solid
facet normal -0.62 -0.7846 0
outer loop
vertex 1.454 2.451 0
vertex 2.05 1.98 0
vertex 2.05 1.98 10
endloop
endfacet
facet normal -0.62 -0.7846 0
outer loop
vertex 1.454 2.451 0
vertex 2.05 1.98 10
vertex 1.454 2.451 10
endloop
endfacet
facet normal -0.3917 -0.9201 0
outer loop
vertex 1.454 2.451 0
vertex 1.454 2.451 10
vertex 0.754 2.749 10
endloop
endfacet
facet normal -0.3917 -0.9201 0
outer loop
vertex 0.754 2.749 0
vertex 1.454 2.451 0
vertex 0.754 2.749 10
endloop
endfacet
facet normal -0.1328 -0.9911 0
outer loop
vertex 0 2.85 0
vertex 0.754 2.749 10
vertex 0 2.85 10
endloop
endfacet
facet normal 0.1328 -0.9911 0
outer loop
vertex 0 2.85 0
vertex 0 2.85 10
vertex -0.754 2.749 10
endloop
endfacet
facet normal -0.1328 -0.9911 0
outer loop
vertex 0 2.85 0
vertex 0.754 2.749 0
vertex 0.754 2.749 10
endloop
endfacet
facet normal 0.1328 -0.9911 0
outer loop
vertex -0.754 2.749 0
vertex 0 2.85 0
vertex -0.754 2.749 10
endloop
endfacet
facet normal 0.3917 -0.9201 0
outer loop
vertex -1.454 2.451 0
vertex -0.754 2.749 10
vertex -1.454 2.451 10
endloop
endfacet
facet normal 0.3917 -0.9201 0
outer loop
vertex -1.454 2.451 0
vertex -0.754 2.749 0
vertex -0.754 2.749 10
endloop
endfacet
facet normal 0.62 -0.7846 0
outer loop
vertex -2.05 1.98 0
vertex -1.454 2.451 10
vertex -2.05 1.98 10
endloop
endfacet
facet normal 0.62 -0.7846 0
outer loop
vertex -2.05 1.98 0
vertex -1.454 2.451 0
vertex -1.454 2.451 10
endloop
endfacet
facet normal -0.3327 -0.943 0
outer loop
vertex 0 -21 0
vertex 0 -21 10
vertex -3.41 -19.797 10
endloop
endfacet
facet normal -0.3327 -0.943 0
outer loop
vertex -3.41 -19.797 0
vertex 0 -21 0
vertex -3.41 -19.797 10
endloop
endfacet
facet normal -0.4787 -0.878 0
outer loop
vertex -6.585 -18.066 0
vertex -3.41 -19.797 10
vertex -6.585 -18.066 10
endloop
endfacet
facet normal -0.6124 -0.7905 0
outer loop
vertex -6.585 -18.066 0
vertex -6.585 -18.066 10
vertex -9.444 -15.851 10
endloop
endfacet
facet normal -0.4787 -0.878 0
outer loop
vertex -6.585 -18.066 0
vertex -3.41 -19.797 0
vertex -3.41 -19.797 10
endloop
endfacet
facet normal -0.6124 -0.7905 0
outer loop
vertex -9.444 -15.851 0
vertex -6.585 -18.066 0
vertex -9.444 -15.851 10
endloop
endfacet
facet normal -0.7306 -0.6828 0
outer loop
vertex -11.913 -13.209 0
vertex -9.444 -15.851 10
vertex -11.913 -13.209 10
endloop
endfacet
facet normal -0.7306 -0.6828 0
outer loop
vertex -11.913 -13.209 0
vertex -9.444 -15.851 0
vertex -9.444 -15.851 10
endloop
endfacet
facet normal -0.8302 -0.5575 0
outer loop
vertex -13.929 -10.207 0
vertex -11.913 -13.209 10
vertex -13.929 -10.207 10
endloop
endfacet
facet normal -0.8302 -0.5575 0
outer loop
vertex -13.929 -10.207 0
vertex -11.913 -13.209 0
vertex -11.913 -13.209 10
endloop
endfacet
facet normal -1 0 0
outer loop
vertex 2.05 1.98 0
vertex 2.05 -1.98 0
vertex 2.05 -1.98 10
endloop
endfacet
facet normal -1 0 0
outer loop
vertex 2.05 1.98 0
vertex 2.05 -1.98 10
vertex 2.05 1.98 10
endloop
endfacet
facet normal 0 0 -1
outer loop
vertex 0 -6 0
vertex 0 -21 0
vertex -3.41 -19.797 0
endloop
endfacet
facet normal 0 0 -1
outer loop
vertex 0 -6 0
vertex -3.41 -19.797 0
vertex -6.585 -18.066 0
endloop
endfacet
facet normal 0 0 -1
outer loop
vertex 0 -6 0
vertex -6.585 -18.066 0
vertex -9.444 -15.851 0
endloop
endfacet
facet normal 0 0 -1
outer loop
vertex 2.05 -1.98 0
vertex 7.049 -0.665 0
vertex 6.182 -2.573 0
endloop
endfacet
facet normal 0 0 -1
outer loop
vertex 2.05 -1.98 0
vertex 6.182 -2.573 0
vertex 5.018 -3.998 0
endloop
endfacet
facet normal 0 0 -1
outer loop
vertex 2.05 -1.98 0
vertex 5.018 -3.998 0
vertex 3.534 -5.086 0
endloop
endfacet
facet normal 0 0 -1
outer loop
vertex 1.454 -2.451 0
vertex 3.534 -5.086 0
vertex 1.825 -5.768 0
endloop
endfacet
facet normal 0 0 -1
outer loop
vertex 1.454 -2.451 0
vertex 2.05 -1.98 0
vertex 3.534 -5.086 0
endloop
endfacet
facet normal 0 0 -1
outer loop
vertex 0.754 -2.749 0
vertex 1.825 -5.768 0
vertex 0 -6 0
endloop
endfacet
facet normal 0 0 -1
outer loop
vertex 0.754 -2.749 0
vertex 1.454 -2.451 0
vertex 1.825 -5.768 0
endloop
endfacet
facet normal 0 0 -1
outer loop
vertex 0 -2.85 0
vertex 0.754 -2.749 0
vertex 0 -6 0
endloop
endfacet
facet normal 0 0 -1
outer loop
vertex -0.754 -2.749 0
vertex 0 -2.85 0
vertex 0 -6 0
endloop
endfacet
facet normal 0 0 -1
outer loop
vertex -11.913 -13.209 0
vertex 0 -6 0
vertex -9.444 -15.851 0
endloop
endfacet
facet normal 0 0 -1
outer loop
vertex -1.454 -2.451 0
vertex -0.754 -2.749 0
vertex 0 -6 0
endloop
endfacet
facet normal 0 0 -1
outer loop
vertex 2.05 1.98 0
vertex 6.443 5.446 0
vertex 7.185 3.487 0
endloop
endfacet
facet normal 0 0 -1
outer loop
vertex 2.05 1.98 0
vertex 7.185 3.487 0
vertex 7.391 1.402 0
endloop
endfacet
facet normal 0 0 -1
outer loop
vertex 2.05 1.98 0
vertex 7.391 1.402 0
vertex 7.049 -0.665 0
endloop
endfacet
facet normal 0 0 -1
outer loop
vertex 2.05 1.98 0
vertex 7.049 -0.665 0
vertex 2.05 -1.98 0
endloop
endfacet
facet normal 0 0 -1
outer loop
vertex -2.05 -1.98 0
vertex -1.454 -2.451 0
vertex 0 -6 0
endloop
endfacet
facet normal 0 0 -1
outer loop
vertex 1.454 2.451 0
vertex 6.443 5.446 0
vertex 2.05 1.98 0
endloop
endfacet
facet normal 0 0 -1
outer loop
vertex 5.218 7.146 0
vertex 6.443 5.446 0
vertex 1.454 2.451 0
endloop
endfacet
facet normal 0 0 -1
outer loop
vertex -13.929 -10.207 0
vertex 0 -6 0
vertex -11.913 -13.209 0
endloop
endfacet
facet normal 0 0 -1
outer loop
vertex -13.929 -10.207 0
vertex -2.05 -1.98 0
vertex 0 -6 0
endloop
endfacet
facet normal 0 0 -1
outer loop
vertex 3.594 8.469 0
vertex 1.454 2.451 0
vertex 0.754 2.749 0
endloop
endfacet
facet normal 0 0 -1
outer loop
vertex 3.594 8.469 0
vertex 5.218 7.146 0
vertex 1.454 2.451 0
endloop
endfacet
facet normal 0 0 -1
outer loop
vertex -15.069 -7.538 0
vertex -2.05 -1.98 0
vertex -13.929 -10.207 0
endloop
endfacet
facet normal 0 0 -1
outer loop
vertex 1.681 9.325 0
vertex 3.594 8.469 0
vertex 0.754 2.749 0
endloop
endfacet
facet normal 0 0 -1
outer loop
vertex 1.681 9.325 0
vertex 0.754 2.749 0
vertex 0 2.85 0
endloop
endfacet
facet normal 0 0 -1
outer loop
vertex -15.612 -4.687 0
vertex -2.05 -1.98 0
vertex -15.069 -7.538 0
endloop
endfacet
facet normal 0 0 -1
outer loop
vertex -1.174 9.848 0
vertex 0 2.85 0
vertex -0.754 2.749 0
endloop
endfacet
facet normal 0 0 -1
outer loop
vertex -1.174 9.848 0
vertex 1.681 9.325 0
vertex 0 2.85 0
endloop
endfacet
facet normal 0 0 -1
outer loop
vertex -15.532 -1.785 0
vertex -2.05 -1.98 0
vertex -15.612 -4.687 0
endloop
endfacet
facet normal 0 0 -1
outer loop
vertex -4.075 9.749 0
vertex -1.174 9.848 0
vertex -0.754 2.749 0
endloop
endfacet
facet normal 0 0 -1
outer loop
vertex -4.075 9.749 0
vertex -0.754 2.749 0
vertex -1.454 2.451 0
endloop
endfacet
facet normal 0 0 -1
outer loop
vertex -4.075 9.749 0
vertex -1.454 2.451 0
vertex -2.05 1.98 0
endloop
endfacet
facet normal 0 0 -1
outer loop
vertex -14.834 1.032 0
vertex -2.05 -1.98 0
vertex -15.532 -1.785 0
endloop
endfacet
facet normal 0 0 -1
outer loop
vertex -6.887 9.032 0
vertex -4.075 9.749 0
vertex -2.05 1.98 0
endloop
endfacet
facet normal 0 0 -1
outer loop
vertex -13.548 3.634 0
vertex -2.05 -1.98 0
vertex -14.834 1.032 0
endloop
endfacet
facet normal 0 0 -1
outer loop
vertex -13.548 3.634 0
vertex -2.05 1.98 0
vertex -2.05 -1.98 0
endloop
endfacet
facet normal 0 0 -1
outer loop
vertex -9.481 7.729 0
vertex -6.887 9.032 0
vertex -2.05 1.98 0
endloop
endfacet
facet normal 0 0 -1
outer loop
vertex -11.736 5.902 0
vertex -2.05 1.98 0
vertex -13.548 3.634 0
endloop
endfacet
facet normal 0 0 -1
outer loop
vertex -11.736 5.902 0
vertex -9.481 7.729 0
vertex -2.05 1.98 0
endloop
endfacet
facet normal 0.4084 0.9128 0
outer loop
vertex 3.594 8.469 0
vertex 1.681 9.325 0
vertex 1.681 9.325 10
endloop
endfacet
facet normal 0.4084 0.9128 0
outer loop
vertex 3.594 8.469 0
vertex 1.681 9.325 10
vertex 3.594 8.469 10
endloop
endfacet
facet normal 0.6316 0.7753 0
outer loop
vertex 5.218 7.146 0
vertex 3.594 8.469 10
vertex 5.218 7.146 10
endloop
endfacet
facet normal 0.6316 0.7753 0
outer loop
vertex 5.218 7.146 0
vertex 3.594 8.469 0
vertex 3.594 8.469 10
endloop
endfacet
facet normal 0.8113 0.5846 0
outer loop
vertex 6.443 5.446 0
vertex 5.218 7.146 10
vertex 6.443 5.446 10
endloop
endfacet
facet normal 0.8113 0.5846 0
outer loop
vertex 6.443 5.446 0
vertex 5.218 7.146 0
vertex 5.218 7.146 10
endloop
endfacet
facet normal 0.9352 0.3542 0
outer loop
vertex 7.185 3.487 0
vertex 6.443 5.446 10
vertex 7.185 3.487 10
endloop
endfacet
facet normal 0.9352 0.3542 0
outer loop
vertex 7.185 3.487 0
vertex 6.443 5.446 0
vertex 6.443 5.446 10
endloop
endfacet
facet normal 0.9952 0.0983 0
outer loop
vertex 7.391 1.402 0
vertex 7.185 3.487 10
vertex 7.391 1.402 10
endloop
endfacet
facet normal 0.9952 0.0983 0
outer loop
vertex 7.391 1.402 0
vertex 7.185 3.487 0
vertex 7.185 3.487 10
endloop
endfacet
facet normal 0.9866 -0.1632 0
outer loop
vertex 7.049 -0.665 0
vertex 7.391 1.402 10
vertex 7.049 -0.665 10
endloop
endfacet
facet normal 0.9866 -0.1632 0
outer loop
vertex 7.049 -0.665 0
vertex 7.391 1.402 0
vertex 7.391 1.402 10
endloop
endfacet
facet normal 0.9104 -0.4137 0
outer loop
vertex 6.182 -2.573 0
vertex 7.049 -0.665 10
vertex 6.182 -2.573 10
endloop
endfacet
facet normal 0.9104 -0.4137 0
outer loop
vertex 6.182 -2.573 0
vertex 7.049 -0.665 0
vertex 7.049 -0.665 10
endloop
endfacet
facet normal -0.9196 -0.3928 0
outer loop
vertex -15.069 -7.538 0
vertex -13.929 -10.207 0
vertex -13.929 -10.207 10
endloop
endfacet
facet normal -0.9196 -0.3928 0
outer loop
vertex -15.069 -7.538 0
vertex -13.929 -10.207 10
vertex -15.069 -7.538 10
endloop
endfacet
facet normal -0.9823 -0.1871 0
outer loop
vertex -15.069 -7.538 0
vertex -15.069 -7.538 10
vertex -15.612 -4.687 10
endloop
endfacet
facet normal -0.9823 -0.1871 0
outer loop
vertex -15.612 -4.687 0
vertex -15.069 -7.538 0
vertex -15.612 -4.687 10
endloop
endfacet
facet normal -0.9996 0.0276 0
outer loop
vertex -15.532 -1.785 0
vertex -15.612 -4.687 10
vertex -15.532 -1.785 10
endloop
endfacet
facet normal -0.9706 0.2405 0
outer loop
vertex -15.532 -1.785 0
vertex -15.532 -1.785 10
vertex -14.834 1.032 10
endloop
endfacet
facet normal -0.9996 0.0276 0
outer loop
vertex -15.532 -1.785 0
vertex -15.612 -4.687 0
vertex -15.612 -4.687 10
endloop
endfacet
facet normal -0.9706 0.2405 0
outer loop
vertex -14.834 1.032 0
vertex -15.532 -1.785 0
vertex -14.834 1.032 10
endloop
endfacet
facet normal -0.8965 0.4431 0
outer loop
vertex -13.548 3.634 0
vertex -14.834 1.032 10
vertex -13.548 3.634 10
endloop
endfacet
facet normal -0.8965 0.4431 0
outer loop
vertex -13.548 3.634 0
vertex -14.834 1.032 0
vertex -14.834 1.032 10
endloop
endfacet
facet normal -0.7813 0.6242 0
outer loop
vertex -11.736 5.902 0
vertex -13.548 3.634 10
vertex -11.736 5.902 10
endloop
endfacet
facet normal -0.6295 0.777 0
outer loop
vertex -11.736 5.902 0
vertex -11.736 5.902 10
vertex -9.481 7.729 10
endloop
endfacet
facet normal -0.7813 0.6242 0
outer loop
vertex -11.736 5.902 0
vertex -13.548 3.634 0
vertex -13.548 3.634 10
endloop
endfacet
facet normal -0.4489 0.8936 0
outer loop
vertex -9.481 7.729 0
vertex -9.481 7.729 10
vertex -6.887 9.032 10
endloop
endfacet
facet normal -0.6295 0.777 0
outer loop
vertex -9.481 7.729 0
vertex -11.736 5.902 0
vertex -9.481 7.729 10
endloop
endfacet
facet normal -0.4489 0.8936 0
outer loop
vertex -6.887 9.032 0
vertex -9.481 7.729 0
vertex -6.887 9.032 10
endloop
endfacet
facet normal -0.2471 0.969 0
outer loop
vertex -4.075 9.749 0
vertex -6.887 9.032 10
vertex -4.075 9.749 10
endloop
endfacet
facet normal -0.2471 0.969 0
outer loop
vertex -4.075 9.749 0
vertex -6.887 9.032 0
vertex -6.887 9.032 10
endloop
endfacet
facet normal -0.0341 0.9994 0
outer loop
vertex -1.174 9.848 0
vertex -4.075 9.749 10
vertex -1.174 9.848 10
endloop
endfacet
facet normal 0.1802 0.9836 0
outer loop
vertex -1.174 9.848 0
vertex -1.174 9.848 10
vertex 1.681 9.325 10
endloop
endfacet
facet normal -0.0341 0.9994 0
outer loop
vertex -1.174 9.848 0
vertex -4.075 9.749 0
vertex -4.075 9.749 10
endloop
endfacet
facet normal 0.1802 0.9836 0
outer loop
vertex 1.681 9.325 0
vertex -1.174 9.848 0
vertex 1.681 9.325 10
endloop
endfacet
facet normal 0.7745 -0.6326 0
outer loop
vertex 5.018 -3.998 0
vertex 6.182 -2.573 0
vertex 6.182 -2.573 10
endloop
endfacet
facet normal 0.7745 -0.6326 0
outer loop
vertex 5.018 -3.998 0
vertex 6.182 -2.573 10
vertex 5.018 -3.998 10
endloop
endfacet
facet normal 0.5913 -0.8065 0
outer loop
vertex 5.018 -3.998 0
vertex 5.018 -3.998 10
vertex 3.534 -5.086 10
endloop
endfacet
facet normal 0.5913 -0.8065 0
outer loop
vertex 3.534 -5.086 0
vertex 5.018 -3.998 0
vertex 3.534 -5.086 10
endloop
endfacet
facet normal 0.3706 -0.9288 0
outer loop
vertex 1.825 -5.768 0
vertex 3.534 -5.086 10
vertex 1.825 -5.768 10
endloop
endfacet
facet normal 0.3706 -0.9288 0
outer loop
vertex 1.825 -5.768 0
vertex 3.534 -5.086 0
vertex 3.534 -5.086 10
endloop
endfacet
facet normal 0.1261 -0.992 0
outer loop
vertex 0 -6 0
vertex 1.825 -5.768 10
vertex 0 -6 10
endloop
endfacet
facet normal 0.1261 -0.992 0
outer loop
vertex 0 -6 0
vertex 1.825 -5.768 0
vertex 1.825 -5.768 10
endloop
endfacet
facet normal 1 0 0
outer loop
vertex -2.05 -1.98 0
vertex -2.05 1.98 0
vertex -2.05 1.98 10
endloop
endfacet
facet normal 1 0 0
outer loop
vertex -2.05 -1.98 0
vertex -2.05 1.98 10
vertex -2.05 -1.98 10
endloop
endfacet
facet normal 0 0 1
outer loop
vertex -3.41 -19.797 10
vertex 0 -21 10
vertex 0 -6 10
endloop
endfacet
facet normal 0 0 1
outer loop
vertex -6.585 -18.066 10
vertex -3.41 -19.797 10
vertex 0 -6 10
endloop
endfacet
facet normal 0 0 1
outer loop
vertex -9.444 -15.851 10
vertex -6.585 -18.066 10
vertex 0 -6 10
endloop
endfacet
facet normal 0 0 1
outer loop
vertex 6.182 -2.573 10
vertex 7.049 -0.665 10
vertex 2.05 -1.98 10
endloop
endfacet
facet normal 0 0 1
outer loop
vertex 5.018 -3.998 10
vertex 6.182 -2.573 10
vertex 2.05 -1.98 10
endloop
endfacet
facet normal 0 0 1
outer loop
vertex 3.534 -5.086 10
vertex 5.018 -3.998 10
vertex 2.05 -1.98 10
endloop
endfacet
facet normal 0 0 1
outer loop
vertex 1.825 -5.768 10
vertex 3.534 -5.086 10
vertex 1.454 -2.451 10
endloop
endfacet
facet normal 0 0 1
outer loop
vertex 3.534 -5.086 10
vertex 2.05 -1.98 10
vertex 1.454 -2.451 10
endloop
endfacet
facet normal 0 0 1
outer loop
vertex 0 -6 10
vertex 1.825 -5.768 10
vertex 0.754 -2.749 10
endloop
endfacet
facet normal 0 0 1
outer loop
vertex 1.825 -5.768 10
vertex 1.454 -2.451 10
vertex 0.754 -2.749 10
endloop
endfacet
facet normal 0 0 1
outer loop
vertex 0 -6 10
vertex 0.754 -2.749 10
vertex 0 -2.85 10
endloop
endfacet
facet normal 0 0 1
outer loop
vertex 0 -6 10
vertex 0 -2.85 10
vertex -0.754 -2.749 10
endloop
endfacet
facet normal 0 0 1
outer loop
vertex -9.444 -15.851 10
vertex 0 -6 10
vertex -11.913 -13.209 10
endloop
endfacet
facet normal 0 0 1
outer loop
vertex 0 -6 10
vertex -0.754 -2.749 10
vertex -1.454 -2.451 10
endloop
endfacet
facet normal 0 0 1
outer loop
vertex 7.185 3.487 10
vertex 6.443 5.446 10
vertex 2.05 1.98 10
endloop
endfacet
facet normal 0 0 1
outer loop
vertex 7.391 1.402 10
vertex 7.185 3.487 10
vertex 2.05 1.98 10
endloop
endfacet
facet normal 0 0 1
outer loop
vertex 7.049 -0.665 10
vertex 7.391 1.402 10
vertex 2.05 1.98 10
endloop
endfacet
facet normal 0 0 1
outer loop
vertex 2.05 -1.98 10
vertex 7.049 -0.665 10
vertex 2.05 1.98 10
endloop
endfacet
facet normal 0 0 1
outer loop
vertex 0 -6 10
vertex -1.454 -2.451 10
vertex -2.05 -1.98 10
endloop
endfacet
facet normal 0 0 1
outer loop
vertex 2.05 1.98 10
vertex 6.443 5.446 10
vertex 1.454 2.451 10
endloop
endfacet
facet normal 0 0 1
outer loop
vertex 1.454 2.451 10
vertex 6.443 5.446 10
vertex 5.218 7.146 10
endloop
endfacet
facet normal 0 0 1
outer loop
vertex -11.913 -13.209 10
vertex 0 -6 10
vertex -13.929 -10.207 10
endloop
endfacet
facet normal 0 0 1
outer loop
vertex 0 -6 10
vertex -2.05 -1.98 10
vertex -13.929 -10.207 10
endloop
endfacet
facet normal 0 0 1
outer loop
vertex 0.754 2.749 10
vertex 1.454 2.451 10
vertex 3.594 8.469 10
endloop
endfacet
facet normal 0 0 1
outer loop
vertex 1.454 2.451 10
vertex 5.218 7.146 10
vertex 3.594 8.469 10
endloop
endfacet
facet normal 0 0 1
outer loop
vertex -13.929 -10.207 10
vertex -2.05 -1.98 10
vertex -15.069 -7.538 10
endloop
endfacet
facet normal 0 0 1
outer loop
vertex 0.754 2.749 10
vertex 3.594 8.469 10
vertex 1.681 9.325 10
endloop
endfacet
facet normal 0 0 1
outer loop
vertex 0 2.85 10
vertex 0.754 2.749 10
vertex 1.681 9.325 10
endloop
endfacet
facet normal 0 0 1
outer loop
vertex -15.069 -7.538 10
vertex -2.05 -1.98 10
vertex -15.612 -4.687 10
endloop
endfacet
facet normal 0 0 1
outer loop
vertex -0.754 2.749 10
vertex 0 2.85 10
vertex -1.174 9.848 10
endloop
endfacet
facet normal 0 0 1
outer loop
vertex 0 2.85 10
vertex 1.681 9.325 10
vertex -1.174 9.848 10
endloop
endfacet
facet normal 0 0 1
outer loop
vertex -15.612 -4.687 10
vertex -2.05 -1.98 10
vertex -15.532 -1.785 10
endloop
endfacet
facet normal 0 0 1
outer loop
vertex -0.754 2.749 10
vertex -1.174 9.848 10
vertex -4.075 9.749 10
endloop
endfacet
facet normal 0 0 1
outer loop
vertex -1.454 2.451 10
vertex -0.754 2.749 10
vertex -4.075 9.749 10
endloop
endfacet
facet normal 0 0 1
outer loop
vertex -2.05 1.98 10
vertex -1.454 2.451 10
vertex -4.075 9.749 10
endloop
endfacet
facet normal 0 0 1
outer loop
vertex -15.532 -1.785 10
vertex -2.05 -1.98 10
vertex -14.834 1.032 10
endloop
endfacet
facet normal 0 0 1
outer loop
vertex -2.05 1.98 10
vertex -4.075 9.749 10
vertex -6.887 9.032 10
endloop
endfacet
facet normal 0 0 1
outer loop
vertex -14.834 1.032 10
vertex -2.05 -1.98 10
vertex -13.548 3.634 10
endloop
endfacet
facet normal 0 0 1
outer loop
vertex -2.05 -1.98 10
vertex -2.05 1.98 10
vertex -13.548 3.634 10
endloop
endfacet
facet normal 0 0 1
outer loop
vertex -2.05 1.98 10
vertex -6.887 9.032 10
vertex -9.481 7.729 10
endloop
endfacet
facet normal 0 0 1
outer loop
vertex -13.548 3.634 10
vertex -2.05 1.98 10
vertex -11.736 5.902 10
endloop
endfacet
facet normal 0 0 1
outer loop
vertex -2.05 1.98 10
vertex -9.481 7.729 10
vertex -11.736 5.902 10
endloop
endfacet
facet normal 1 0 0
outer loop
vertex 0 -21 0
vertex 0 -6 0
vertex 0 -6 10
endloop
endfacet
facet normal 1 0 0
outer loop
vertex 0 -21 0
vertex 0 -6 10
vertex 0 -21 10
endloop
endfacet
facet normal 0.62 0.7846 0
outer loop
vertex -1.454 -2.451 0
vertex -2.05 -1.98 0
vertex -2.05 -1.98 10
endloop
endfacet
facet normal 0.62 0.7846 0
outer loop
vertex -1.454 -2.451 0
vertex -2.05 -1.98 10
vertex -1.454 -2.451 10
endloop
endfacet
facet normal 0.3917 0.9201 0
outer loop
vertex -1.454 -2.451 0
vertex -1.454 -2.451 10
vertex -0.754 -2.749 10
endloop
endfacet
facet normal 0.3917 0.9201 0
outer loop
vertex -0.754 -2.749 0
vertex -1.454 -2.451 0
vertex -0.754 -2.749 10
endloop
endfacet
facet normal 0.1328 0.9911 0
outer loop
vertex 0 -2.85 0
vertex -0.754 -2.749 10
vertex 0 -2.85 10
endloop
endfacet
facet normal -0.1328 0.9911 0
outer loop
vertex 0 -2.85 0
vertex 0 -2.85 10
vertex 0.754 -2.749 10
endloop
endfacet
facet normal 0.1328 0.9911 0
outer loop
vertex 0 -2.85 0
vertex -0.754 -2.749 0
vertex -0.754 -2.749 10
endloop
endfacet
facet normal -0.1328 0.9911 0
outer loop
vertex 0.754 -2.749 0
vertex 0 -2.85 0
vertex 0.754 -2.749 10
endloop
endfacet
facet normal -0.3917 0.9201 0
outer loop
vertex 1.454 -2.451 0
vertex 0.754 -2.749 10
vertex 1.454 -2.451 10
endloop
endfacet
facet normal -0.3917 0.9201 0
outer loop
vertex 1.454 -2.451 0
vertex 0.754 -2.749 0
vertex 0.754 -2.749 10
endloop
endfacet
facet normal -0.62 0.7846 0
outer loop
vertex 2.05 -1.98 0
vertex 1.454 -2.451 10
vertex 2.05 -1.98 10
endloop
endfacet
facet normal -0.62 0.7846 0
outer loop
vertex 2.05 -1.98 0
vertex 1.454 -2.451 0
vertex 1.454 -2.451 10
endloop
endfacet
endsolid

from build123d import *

# Parameters (mm, degrees)
EXTRUDE_448_DEPTH = 10


with BuildPart() as part:
    # Эскиз1 → Extrude 448 (new body)
    with BuildSketch(Plane.XY):
        with BuildLine():
            Line((0, -6), (0, -21))
            ThreePointArc((0, -21), (-8.058831333, -17.01600504), (-13.929161871, -10.207466455))
            ThreePointArc((-13.929161871, -10.207466455), (-12.703453351, 4.817077167), (1.681331293, 9.324542439))
            ThreePointArc((1.681331293, 9.324542439), (6.878554189, 4.4907399), (6.181719822, -2.572630025))
            ThreePointArc((6.181719822, -2.572630025), (3.534137975, -5.085826245), (0, -6))
        make_face()
        with BuildLine():
            Line((-2.05, 1.979898987), (-2.05, -1.979898987))
            ThreePointArc((-2.05, -1.979898987), (0, -2.85), (2.05, -1.979898987))
            Line((2.05, -1.979898987), (2.05, 1.979898987))
            ThreePointArc((2.05, 1.979898987), (0, 2.85), (-2.05, 1.979898987))
        make_face(mode=Mode.SUBTRACT)
    extrude(amount=EXTRUDE_448_DEPTH)


solid = part.part
